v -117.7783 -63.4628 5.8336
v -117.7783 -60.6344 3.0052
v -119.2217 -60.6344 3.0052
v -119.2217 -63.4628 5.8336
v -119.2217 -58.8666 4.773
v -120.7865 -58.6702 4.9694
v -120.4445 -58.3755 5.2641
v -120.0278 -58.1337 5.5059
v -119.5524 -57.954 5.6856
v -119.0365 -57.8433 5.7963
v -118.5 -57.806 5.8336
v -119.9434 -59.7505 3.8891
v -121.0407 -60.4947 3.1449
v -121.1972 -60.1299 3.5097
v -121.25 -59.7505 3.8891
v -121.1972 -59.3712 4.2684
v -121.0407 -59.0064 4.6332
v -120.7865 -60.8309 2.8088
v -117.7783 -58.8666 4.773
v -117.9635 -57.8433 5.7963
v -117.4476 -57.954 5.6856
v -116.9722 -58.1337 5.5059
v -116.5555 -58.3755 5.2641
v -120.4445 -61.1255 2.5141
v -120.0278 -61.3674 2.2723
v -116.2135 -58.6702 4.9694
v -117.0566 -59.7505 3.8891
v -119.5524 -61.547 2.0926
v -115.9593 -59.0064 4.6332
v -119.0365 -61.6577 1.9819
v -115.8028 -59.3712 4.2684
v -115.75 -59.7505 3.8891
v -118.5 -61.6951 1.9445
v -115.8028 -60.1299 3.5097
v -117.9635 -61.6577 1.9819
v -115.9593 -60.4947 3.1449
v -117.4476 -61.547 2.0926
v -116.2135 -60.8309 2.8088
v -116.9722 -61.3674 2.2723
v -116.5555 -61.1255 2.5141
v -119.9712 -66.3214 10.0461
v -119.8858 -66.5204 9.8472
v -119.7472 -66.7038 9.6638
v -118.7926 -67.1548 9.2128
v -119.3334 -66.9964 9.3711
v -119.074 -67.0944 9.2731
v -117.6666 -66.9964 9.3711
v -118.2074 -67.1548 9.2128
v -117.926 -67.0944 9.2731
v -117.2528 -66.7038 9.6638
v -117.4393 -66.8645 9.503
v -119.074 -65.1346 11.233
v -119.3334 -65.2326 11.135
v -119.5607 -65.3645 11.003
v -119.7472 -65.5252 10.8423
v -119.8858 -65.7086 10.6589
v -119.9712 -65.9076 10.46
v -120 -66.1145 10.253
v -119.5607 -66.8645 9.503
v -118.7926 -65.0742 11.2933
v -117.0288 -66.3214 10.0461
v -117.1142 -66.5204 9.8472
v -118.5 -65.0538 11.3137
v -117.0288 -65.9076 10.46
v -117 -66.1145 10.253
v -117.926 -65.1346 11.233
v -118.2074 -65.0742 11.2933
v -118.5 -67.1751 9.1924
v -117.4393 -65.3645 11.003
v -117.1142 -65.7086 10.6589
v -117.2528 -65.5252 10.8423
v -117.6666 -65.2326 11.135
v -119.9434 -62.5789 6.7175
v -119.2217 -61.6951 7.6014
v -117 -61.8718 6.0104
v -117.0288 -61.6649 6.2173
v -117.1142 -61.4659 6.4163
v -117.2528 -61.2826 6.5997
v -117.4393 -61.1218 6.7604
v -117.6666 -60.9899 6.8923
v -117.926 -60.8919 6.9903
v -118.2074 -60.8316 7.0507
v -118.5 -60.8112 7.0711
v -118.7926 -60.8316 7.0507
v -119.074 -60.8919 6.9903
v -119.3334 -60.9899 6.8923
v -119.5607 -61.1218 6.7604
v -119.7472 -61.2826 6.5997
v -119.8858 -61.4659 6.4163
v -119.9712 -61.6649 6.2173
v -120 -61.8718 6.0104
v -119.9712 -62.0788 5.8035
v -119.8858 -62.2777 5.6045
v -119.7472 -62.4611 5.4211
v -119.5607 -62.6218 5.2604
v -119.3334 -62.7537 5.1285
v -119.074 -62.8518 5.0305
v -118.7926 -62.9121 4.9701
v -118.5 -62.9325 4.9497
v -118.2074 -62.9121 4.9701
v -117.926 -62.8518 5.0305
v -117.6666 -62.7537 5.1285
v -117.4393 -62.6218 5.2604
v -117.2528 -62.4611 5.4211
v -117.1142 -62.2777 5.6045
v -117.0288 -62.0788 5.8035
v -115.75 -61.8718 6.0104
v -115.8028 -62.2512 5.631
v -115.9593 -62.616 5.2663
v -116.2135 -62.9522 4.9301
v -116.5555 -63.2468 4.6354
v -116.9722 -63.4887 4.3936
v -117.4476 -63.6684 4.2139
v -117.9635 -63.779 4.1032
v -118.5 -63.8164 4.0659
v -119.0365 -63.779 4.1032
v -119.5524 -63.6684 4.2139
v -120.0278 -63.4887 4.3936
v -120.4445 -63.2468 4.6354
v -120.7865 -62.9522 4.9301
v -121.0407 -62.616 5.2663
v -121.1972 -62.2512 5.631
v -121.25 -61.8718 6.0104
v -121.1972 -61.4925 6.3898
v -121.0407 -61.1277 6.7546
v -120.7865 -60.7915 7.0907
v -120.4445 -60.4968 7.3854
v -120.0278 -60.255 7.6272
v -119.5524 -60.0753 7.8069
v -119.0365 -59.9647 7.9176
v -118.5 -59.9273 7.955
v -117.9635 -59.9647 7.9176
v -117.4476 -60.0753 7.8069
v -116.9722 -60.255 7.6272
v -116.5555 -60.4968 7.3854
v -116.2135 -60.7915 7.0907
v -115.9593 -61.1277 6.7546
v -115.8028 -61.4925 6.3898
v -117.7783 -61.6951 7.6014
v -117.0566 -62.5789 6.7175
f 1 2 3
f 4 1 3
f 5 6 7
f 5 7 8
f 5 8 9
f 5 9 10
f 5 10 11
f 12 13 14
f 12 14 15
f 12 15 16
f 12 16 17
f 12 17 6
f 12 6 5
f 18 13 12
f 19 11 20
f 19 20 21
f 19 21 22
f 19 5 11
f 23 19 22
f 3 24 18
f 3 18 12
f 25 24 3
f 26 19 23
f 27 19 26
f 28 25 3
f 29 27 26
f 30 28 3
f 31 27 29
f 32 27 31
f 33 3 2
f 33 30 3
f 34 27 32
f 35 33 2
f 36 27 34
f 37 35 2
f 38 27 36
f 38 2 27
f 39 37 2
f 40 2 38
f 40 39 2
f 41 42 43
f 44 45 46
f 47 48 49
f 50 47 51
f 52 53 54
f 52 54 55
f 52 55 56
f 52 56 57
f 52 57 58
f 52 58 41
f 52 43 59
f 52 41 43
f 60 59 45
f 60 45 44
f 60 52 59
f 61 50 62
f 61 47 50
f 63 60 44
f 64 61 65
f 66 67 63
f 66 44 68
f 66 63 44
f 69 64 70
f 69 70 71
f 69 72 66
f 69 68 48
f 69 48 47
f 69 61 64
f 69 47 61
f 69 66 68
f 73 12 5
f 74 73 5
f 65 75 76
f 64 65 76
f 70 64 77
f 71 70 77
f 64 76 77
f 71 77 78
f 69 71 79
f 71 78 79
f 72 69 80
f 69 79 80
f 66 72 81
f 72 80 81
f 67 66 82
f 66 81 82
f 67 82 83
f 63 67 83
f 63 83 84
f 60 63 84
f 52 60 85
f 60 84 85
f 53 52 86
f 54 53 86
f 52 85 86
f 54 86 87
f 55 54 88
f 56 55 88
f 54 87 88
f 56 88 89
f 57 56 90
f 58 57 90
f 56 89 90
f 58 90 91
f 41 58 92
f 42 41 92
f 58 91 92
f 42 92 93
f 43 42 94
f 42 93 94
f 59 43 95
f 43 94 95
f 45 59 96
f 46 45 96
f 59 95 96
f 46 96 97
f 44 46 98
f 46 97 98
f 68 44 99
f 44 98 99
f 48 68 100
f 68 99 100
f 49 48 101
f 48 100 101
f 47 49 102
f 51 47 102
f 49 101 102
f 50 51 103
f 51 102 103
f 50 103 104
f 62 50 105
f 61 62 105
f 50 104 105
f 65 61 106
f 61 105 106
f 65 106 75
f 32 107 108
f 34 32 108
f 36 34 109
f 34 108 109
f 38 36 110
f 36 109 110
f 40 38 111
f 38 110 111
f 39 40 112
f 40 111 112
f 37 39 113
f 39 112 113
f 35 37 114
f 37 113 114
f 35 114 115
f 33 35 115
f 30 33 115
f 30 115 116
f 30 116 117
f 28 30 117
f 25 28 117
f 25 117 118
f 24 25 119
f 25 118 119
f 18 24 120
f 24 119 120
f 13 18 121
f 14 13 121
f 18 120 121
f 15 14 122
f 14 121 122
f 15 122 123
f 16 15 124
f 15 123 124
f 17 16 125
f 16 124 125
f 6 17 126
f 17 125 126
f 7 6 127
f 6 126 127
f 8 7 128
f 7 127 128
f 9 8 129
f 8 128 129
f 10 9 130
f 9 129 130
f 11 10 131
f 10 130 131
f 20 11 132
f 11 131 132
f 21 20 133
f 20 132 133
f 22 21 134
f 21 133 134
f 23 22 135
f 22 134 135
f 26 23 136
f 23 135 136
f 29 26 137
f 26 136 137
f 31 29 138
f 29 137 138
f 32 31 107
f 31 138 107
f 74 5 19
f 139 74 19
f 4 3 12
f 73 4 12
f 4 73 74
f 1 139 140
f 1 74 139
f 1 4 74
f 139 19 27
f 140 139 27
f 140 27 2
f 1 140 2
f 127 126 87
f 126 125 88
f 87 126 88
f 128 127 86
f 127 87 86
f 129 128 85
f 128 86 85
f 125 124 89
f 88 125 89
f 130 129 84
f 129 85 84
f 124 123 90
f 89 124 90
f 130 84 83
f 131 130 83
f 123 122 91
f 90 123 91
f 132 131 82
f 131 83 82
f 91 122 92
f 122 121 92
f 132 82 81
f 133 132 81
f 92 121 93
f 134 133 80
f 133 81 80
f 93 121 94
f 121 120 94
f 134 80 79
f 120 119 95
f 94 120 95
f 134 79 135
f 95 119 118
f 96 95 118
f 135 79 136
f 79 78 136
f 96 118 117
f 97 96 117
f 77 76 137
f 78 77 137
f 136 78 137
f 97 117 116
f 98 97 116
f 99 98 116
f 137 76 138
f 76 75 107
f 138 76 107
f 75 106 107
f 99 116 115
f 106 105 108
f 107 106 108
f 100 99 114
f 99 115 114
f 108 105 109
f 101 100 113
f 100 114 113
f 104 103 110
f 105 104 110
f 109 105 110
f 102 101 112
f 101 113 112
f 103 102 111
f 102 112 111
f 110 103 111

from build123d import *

# Parameters (mm, degrees)
SKETCH036_R             = 2.75
PAD021_DEPTH            = 3
SKETCH037_R             = 1.5
PAD022_DEPTH            = 6
POCKET017_DEPTH         = 4
BODY010_PLACEMENT_ANGLE = 225


with BuildPart() as part:
    # Sketch036 → Pad021 (new body)
    with BuildSketch(Plane.XY):
        Circle(SKETCH036_R)
    extrude(amount=PAD021_DEPTH)

    # Sketch037 (on Face2 of Pad021) → Pad022 (join)
    with BuildSketch(Plane(origin=(0, 0, 0), x_dir=(1, 0, 0), z_dir=(0, 0, -1))):
        Circle(SKETCH037_R)
    extrude(amount=PAD022_DEPTH)

    # Sketch038 (on DatumPlane) → Pocket017 (cut)
    with BuildSketch(Plane.XY.offset(3)):
        Polygon((0.721688, -1.25), (1.443376, 0), (0.721688, 1.25), (-0.721688, 1.25), (-1.443376, 0), (-0.721688, -1.25), align=None)
    extrude(amount=-POCKET017_DEPTH, mode=Mode.SUBTRACT)


with BuildPart() as part_1:
    # Body010 placement: moved
    add(part.part.moved(Location((-118.5, -61.871843, 6.010408))).rotate(Axis((-118.5, -61.871843, 6.010408), (1, 0, 0)), BODY010_PLACEMENT_ANGLE))


solid = part_1.part
